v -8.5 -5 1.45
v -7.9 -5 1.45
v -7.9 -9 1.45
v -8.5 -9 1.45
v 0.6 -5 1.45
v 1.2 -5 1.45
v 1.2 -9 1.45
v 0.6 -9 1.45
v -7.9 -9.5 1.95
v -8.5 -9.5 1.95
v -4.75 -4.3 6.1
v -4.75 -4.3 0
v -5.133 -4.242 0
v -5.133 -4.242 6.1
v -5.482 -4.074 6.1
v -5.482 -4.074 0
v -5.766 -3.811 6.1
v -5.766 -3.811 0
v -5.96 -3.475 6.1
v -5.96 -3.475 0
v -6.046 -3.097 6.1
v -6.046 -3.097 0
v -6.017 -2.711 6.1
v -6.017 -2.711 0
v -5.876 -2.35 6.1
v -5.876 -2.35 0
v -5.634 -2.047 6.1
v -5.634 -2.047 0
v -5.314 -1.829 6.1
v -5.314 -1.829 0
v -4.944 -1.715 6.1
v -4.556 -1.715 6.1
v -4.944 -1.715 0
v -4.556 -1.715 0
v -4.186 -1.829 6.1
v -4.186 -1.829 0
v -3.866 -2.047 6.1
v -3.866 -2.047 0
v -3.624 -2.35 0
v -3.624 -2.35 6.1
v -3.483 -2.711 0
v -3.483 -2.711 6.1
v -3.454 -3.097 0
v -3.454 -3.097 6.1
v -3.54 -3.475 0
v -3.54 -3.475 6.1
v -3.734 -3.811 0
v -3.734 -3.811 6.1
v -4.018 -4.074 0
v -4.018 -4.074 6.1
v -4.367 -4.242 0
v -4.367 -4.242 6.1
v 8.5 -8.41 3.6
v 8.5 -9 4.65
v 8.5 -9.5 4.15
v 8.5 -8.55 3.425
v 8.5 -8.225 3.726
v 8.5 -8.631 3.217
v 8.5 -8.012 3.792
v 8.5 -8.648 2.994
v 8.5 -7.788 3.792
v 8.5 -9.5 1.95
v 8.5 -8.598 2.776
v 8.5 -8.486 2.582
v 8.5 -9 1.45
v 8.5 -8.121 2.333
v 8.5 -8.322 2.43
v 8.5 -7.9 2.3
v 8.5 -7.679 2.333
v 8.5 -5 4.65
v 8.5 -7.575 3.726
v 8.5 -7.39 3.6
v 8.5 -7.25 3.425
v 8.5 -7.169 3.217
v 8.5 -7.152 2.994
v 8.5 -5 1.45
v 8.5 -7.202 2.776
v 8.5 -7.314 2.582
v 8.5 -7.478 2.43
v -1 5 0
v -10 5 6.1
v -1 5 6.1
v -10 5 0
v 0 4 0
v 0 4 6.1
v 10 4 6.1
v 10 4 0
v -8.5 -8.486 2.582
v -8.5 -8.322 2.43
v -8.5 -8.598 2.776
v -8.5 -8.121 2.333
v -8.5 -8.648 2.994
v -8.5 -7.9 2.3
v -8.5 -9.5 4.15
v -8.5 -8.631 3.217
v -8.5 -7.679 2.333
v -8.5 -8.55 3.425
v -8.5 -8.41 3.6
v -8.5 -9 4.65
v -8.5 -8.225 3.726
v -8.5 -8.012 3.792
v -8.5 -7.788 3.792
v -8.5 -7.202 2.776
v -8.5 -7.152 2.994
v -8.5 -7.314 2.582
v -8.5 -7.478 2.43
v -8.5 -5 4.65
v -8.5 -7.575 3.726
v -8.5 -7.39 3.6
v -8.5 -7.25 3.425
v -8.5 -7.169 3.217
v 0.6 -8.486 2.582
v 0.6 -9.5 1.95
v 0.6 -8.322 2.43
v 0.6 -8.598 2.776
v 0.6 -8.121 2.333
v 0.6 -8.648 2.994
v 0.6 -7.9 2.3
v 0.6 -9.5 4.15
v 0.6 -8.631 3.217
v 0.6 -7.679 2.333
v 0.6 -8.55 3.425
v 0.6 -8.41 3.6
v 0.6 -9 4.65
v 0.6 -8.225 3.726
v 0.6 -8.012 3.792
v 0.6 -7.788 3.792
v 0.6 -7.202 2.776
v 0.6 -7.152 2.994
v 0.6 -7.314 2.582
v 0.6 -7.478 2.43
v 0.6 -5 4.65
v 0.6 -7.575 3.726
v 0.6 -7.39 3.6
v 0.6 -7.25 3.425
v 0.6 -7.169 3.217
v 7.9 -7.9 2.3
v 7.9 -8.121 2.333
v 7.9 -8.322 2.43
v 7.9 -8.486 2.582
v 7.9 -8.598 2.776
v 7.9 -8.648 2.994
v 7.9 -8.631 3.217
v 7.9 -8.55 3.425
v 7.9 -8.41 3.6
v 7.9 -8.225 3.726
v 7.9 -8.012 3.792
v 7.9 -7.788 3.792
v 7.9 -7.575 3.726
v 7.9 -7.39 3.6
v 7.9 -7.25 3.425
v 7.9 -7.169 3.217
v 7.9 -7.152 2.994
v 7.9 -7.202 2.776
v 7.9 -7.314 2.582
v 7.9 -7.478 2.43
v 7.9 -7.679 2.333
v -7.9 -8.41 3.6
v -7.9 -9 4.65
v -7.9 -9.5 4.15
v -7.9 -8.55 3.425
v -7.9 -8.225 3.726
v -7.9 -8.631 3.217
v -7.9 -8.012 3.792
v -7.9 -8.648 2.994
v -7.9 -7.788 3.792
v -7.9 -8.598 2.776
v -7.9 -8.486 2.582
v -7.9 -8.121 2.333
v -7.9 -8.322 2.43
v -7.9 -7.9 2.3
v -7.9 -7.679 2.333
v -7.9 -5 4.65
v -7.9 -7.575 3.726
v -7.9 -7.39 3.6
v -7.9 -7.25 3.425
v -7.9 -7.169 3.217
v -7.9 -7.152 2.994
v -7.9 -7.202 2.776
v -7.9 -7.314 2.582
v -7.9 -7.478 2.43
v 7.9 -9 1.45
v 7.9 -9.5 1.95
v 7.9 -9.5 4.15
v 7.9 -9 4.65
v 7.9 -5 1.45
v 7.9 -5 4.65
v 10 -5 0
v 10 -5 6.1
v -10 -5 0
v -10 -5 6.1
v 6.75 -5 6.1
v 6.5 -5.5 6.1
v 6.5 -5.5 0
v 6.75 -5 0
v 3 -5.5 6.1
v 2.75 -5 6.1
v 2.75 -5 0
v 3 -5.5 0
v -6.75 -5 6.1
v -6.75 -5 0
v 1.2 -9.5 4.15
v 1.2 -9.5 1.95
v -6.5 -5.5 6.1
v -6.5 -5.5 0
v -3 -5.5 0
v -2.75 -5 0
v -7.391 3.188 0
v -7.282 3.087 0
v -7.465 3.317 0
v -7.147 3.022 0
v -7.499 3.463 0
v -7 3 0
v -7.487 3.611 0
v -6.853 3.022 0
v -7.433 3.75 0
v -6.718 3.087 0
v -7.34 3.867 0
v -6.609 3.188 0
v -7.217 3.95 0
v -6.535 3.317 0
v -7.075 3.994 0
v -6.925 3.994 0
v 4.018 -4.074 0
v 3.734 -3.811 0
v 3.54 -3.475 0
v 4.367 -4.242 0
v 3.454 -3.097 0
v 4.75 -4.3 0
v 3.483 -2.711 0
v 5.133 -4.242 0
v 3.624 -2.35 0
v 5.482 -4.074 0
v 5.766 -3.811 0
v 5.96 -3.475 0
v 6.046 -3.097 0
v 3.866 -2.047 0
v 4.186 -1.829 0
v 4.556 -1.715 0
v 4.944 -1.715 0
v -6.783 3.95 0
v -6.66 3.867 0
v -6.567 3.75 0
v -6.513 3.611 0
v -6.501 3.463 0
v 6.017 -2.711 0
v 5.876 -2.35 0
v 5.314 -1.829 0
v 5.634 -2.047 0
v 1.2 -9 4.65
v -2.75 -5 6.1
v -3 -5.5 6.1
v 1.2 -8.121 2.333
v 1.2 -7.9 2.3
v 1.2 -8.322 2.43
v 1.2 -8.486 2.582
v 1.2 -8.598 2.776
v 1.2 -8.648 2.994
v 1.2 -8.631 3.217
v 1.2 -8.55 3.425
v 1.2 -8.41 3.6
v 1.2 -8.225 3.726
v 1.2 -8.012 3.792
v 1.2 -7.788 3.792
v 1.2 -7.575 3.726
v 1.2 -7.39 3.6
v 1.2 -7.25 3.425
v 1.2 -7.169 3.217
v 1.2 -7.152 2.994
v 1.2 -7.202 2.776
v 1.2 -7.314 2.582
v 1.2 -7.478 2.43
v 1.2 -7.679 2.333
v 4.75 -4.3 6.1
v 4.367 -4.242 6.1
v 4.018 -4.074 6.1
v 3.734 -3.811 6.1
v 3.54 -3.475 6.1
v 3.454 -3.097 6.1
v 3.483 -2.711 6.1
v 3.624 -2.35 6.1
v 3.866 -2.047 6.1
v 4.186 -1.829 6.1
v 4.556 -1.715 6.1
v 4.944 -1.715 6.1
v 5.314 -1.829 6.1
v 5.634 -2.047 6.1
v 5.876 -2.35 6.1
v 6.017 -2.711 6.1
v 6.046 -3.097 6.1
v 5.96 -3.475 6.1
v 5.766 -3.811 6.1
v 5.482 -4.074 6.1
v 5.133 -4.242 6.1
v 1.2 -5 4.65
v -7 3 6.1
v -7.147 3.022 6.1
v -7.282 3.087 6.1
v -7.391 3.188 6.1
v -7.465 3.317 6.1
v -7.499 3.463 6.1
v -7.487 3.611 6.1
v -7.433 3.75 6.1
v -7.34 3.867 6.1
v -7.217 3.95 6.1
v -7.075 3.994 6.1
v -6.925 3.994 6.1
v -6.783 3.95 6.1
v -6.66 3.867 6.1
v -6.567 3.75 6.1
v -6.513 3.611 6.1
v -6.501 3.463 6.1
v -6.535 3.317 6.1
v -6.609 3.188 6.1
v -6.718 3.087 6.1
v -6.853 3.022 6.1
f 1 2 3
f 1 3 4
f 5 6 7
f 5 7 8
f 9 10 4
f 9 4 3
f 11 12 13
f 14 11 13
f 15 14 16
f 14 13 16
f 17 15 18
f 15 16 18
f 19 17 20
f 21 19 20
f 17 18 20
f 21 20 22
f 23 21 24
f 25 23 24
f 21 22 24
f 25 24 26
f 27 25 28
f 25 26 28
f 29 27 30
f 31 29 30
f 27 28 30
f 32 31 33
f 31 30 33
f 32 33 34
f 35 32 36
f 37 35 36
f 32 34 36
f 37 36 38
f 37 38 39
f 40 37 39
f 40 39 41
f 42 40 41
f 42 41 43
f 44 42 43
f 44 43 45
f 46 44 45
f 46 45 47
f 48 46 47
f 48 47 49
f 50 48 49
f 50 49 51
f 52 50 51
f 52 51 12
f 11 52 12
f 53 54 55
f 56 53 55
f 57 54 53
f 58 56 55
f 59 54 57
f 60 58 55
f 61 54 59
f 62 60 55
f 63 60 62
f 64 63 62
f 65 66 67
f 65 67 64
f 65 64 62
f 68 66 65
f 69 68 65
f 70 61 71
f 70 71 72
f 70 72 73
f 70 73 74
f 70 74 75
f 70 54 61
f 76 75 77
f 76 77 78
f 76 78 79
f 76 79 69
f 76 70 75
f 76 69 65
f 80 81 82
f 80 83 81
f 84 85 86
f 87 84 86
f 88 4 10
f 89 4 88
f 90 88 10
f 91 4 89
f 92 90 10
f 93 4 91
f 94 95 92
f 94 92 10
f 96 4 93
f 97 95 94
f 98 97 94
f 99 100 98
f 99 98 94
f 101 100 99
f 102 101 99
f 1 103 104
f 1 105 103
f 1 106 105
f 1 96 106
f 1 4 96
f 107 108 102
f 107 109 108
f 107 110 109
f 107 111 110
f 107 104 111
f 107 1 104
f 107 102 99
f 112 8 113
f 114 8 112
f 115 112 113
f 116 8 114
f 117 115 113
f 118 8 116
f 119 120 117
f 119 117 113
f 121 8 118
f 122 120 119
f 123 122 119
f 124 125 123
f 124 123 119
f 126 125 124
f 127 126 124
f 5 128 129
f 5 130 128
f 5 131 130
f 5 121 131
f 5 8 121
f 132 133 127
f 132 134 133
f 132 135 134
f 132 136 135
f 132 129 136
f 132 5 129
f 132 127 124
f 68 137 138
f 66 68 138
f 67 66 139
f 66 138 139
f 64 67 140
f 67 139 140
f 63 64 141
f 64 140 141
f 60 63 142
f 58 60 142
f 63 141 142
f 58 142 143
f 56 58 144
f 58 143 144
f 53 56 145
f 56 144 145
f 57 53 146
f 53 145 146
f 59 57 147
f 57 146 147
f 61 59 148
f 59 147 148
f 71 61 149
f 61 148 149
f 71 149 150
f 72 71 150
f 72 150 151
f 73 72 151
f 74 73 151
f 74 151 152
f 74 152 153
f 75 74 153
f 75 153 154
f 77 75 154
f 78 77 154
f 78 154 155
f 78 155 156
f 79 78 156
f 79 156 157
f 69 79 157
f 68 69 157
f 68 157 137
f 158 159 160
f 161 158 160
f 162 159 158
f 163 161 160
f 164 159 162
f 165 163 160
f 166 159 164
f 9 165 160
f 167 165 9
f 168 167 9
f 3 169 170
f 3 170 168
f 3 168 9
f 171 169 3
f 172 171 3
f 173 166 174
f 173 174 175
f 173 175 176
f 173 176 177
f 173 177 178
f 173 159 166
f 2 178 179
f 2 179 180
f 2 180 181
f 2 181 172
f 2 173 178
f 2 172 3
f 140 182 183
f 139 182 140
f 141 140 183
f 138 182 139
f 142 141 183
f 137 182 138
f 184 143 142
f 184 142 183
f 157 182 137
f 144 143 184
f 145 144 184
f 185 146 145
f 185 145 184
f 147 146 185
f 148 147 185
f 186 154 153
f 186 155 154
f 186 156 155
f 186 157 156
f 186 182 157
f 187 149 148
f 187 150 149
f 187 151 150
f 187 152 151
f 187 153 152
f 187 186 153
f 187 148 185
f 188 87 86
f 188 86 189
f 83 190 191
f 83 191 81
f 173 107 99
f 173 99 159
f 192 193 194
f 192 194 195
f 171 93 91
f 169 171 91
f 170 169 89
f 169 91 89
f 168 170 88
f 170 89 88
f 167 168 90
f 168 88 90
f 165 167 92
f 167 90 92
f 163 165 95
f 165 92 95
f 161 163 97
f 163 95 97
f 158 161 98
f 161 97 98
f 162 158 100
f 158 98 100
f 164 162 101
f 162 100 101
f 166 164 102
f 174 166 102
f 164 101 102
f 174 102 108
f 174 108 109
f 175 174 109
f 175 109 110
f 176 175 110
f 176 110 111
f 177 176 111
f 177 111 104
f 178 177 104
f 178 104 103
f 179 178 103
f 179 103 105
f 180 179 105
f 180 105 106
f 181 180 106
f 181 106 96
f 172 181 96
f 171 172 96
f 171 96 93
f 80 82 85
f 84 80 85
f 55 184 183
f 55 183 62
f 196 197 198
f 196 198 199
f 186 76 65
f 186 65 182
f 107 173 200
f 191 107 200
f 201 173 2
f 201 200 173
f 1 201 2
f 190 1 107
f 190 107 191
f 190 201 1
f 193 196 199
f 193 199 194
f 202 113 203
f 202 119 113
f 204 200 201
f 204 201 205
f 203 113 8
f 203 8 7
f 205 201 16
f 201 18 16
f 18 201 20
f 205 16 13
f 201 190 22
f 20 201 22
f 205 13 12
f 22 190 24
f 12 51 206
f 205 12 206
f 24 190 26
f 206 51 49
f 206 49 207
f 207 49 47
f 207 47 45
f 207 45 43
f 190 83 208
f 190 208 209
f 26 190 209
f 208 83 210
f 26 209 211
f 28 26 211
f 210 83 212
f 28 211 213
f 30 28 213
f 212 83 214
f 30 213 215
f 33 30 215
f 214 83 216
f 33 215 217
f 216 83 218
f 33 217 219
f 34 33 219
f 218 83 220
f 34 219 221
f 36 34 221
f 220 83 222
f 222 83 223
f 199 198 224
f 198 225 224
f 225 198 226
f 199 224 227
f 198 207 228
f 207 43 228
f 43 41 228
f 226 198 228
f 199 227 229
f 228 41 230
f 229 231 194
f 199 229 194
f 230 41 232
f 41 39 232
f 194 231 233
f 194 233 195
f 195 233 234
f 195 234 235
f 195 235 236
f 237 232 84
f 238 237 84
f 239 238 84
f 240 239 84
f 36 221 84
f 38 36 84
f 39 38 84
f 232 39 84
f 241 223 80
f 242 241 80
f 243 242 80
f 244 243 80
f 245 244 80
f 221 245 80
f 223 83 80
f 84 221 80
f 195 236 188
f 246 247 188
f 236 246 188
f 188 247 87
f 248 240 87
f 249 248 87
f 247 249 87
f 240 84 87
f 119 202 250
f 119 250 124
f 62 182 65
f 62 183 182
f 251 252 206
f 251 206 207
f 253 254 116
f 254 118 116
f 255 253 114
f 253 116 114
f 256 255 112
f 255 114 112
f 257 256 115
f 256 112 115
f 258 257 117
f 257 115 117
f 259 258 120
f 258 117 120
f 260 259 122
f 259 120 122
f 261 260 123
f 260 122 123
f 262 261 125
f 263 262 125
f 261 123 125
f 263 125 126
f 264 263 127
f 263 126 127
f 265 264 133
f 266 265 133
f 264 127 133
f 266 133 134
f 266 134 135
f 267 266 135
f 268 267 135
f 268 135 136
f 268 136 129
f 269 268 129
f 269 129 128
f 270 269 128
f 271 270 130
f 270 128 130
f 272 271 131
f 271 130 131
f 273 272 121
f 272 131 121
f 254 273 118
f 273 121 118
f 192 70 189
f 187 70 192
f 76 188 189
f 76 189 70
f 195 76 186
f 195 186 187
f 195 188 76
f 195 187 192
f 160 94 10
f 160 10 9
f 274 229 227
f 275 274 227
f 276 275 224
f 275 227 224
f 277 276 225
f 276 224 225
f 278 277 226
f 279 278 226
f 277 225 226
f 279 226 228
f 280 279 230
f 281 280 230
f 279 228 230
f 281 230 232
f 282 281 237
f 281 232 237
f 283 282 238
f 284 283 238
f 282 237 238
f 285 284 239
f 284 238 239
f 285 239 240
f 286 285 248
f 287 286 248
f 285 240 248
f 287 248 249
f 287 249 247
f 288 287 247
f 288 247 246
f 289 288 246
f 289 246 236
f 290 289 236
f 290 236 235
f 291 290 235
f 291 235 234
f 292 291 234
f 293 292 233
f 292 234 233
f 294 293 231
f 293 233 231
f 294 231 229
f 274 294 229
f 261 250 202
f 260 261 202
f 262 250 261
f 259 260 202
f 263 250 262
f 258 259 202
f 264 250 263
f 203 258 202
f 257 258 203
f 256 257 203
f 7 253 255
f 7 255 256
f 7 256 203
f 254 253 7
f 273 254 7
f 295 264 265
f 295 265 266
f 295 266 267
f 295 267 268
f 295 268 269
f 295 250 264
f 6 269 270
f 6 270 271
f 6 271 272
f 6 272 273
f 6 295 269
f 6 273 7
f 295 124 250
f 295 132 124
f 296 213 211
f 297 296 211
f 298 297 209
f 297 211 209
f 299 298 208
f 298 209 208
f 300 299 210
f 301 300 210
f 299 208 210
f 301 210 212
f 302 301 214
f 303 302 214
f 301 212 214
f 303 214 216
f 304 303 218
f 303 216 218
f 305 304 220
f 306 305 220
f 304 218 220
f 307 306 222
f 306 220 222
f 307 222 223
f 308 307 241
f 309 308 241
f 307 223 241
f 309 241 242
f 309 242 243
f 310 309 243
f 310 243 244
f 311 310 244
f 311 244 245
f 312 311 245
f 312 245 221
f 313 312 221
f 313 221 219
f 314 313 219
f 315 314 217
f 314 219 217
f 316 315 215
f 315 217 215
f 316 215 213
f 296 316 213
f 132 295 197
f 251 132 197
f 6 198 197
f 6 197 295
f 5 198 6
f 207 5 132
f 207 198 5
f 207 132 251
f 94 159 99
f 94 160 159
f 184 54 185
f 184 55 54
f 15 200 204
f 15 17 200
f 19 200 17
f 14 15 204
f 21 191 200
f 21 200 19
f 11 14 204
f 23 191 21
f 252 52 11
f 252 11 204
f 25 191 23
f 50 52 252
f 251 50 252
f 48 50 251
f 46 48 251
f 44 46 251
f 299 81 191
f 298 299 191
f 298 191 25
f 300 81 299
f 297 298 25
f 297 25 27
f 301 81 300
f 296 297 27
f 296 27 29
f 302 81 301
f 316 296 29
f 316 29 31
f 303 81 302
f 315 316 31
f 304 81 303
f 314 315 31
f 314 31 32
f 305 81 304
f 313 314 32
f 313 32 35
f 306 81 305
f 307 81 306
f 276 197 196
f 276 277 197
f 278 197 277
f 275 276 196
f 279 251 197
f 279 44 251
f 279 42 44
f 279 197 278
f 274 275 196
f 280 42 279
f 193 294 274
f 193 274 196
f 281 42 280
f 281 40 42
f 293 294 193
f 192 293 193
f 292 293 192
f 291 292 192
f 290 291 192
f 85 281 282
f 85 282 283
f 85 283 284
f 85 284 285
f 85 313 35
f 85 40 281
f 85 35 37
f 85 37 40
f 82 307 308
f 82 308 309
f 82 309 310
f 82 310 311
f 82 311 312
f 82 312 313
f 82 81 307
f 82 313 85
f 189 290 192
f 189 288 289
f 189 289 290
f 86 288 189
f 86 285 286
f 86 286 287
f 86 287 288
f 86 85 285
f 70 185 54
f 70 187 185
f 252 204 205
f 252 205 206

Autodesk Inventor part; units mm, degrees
ref_plane "YZ Plane" through (0, 0, 0) normal (1, 0, 0) x (0, 1, 0)
ref_plane "XZ Plane" through (0, 0, 0) normal (0, 1, 0) x (-1, 0, 0)
ref_plane "XY Plane" through (0, 0, 0) normal (0, 0, 1) x (1, 0, 0)
sketch "Sketch1" plane through (0, 0, 0) normal (0, 0, 1) x (1, 0, 0)
  line L0 (-10, 5) -> (10, 5)
  line L1 (10, 5) -> (10, -5)
  line L2 (10, -5) -> (-10, -5)
  line L3 (-10, -5) -> (-10, 5)
  point P0 (0, 0)
  dimension "d0" = 20
  dimension "d1" = 10
  dimension "d2" = 10
  dimension "d3" = 5
extrude "Extrusion1" add sketch "Sketch1" along normal blind 6.1
sketch "Sketch2" plane through (0, 0, 6.1) normal (0, 0, 1) x (1, 0, 0)
  line L0 (10, 5) -> (-10, 5) projected
  line L1 (-1, 5) -> (0, 4)
  line L2 (0, 4) -> (10, 4)
  line L3 (10, -5) -> (10, 5) projected
  line L4 (10, 5) -> (10, 4)
  line L5 (-1, 5) -> (10, 5)
  point P0 (0, 0)
  dimension "d6" = 10
  dimension "d7" = 1
  dimension "d8" = 1
extrude "Extrusion2" cut sketch "Sketch2" against normal through all
sketch "Sketch3" plane through (0, 0, 6.1) normal (0, 0, 1) x (1, 0, 0)
  line L0 (-10, 5) -> (-10, -5) projected
  line L1 (10, -5) -> (10, 4) projected
  line L2 (-10, -5) -> (10, -5) projected
  point P0 (0, 0)
  point P1 (-4.75, -3)
  point P2 (4.75, -3)
  dimension "d36" = 5.25
  dimension "d38" = 2
  dimension "d39" = 2
  dimension "d41" = 9.5
sketch "Sketch4" plane through (0, 0, 6.1) normal (0, 0, 1) x (1, 0, 0)
  line L0 (-10, -5) -> (10, -5) projected
  line L1 (-10, 5) -> (-10, -5) projected
  line L2 (-6.75, -5) -> (-6.5, -5.5)
  line L3 (-6.5, -5.5) -> (-3, -5.5)
  line L4 (-3, -5.5) -> (-2.75, -5)
  line L5 (-6.75, -5) -> (-2.75, -5)
  line L6 (2.75, -5) -> (3, -5.5)
  line L7 (3, -5.5) -> (6.5, -5.5)
  line L8 (6.5, -5.5) -> (6.75, -5)
  line L9 (2.75, -5) -> (6.75, -5)
  line L10 (10, -5) -> (10, 4) projected
  point P0 (0, 0)
  point P1 (6.75, -5)
  dimension "d16" = 0.5
  dimension "d17" = 4
  dimension "d19" = 3.5
  dimension "d20" = 0.25
  dimension "d22" = 4
  dimension "d23" = 3.5
  dimension "d24" = 0.25
  dimension "d25" = 0.5
  dimension "d26" = 0
  dimension "d40" = 3.5
  dimension "d43" = 3.5
extrude "Extrusion3" add sketch "Sketch4" against normal blind 6.1
hole "Hole1" at (-4.75, -3, 6.1) at (4.75, -3, 6.1) direction (0, 0, -1) diameter 2.6 end through all
sketch "Sketch5" plane through (-2.75, -5, 0) normal (0, -1, 0) x (1, 0, 0)
  line L0 (-7.25, 0) -> (-7.25, 6.1) projected
  line L1 (-7.25, 3.05) -> (12.75, 3.05)
  line L2 (12.75, 0) -> (12.75, 6.1) projected
  line L3 (-5.15, 1.45) -> (-5.75, 1.45)
  line L4 (-5.75, 1.45) -> (-5.75, 4.65)
  line L5 (-5.75, 4.65) -> (-5.15, 4.65)
  line L6 (-5.15, 4.65) -> (-5.15, 1.45)
  line L7 (-5.15, 1.45) -> (-5.75, 4.65) construction
  line L8 (-5.75, 1.45) -> (-5.15, 4.65) construction
  line L9 (3.95, 1.45) -> (3.35, 1.45)
  line L10 (3.35, 1.45) -> (3.35, 4.65)
  line L11 (3.35, 4.65) -> (3.95, 4.65)
  line L12 (3.95, 4.65) -> (3.95, 1.45)
  line L13 (3.95, 1.45) -> (3.35, 4.65) construction
  line L14 (3.35, 1.45) -> (3.95, 4.65) construction
  line L15 (11.25, 1.45) -> (10.65, 1.45)
  line L16 (10.65, 1.45) -> (10.65, 4.65)
  line L17 (10.65, 4.65) -> (11.25, 4.65)
  line L18 (11.25, 4.65) -> (11.25, 1.45)
  line L19 (11.25, 1.45) -> (10.65, 4.65) construction
  line L20 (10.65, 1.45) -> (11.25, 4.65) construction
  point P0 (2.75, 0)
  point P1 (-5.45, 3.05)
  point P2 (3.65, 3.05)
  point P3 (10.95, 3.05)
  dimension "d44" = 3.2
  dimension "d45" = 0.6
  dimension "d46" = 0.6
  dimension "d47" = 0.6
  dimension "d48" = 1.5
  dimension "d49" = 1.5
  dimension "d50" = 8.5
extrude "Extrusion4" add sketch "Sketch5" along normal blind 4.5
chamfer "Chamfer1" distance 0.5 angle 45 6 edges at (-8.2, -9.5, 4.65) (-8.2, -9.5, 1.45) (0.9, -9.5, 4.65) (0.9, -9.5, 1.45) (8.2, -9.5, 4.65) (8.2, -9.5, 1.45)
sketch "Sketch6" plane through (8.5, -5, 4.65) normal (1, 0, 0) x (0, 0, -1)
  line L0 (3.2, 0) -> (3.2, -4) projected
  line L1 (2.7, -4.5) -> (0.5, -4.5) projected
  point P0 (4.65, 5)
  point P1 (1.6, -2.9)
  dimension "d56" = 1.6
  dimension "d57" = 1.6
hole "Hole2" at (8.5, -7.9, 3.05) direction (-1, 0, 0) diameter 1.5 end through all
sketch "Sketch7" plane through (0, 0, 6.1) normal (0, 0, 1) x (1, 0, 0)
  line L0 (-10, 5) -> (-10, -5) projected
  line L1 (-1, 5) -> (-10, 5) projected
  point P0 (0, 0)
  point P1 (-7, 3.5)
  dimension "d65" = 3
  dimension "d66" = 1.5
hole "Hole3" at (-7, 3.5, 6.1) direction (0, 0, -1) diameter 1 end through all
